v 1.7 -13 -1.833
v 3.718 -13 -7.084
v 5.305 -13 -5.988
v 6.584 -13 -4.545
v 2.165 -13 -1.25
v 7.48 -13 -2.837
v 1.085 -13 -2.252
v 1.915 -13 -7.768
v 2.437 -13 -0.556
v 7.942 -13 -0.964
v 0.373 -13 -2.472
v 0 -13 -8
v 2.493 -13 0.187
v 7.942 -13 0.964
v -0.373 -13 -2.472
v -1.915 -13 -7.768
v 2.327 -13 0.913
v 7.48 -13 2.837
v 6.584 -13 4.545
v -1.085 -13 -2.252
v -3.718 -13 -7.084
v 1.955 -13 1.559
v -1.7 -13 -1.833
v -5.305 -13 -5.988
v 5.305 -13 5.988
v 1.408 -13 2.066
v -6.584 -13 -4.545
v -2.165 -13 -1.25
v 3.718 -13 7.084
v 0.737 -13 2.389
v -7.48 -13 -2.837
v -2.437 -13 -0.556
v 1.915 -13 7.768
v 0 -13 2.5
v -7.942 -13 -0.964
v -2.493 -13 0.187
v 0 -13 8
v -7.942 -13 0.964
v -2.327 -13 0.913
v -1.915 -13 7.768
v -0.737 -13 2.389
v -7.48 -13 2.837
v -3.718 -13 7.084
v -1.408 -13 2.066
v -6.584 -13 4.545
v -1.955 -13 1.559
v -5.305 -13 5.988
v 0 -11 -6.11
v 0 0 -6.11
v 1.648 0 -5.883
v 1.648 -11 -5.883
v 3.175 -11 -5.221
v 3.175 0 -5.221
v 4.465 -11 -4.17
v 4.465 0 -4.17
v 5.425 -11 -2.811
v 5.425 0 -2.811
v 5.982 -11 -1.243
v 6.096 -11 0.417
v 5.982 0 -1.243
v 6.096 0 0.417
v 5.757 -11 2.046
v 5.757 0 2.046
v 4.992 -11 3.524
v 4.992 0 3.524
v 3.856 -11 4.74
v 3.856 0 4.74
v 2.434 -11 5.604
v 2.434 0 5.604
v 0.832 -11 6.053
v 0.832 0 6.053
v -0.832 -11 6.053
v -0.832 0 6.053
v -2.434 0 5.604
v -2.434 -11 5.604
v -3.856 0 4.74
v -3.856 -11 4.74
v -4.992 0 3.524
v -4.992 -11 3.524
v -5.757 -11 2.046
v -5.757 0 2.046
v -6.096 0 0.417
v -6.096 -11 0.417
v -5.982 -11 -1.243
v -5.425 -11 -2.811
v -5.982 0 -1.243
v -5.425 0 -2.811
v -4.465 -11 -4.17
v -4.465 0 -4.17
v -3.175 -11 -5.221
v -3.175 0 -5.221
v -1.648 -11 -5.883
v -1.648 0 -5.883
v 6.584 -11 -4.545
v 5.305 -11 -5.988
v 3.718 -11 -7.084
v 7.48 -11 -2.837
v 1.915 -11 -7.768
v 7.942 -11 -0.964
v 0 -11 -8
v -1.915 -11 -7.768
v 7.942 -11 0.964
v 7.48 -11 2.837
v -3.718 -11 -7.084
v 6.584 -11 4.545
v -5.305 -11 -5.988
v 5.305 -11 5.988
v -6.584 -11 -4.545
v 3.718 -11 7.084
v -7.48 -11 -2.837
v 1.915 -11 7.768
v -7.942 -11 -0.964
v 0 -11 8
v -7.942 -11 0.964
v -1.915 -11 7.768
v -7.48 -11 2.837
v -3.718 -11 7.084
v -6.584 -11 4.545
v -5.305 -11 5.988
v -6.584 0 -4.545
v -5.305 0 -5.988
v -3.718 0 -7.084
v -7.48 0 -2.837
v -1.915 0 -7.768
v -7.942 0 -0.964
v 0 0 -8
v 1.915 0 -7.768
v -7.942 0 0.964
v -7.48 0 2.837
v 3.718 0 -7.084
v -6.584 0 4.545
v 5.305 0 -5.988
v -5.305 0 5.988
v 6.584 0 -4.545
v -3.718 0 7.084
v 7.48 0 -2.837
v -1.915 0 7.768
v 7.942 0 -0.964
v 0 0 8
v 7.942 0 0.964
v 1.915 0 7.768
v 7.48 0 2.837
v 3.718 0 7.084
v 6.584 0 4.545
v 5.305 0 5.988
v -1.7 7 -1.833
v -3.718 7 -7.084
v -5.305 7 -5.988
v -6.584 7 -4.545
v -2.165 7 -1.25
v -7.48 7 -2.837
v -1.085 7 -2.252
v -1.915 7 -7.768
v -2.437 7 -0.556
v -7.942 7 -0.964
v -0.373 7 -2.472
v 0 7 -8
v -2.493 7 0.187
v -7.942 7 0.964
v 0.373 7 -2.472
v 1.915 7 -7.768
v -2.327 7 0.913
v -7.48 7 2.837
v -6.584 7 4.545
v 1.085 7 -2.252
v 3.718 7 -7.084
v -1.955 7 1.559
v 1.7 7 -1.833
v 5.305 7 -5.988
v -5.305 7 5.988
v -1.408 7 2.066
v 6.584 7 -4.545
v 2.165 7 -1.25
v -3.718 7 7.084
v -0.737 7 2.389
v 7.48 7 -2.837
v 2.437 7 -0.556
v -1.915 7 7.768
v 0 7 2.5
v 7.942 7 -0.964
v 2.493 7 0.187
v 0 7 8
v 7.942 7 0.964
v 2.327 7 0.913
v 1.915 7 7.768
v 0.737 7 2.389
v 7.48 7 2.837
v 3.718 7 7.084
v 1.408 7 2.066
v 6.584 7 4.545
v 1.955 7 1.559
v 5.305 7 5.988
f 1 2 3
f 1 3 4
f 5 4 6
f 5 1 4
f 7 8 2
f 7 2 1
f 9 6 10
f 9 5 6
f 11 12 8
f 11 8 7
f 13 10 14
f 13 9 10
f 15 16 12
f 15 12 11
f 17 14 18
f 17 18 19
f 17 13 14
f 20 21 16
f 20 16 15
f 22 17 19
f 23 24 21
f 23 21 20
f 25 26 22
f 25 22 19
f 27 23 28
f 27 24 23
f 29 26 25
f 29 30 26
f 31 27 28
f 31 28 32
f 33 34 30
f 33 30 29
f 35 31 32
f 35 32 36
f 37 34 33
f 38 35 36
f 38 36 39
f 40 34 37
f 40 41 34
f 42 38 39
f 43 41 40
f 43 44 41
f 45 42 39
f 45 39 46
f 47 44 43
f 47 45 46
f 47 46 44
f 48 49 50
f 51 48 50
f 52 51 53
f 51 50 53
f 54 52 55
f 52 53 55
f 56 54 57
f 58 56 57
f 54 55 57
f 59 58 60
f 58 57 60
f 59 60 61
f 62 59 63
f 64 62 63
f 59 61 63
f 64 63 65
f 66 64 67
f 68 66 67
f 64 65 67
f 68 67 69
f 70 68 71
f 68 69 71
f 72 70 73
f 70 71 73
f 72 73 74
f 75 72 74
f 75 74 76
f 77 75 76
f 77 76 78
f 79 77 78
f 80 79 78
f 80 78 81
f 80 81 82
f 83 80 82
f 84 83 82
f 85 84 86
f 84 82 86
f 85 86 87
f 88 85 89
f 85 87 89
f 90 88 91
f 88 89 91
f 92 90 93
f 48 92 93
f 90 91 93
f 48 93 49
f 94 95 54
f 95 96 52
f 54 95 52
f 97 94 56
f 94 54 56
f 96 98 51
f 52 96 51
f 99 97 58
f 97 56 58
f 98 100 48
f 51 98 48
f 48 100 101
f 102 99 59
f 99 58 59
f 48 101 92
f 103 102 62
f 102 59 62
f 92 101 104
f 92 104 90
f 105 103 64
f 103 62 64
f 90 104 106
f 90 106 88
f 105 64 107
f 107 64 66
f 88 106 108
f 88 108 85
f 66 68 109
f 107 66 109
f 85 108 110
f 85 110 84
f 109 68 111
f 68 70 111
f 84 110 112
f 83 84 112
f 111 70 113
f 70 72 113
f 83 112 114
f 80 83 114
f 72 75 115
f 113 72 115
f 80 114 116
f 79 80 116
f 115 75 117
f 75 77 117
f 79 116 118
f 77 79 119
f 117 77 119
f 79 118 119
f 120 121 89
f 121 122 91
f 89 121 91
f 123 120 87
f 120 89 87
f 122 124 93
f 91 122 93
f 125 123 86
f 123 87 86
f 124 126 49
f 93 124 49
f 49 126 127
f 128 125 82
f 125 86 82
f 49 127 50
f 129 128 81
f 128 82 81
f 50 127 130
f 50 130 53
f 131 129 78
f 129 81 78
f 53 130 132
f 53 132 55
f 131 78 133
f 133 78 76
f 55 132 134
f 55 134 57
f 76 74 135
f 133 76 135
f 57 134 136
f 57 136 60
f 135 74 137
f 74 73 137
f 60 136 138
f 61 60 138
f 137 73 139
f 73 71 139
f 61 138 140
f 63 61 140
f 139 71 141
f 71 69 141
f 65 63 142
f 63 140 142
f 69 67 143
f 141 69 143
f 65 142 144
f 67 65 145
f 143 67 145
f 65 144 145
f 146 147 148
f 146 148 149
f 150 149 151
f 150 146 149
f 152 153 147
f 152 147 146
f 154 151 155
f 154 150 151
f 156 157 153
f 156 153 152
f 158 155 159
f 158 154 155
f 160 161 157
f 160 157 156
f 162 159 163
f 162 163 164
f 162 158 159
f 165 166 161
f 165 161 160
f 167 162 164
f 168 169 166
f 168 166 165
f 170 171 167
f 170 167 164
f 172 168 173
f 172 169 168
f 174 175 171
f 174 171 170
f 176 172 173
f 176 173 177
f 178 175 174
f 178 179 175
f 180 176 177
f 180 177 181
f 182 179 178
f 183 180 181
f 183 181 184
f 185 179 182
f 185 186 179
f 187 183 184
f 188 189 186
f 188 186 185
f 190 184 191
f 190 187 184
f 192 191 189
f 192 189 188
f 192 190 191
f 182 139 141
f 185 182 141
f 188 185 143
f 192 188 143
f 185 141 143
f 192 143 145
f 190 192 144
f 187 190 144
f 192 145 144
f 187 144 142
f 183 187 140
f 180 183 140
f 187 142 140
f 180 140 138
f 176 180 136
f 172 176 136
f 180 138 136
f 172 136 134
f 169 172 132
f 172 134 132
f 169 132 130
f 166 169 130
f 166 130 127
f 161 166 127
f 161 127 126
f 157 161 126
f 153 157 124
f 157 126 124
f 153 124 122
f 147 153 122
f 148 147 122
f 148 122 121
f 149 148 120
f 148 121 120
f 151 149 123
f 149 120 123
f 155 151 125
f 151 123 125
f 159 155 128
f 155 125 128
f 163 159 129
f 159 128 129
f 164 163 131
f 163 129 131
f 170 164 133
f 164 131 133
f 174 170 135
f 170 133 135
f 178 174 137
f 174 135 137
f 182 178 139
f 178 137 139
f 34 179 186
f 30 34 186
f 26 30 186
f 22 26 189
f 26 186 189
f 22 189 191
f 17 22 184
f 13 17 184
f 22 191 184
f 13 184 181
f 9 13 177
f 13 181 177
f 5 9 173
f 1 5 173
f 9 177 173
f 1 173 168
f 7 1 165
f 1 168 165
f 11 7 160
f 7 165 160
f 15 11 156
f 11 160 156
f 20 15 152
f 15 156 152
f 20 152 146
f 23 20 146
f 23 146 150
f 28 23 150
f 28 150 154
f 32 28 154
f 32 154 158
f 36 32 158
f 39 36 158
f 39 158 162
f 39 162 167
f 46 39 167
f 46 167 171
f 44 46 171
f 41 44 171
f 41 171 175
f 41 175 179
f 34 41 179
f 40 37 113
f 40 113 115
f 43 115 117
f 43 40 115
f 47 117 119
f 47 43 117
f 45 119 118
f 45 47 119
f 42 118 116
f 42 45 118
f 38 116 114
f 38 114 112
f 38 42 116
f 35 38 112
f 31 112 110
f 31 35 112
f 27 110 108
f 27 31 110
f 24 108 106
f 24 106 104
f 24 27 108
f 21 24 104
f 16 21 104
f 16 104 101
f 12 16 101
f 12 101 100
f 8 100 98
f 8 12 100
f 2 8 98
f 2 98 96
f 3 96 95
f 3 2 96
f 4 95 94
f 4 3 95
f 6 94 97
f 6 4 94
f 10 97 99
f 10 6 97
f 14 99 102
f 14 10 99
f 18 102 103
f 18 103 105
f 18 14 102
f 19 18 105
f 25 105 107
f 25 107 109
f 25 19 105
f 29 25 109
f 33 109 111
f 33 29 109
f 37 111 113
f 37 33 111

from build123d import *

# Parameters (mm, degrees)
SKETCH_1_R          = 8
EXTRUDE_1_DEPTH     = 7
SKETCH_2_R          = 6.11
EXTRUDE_2_DEPTH     = 11
EXTRUDE_START       = 2
SKETCH_3_R          = 8
EXTRUDE_3_DEPTH     = 2
SKETCH_4_R          = 2.5
CUT_EXTRUDE_1_DEPTH = 25


with BuildPart() as part:
    # 草图1 → 凸台-拉伸1 (new body)
    with BuildSketch(Plane(origin=(0, 0, 0), x_dir=(1, 0, 0), z_dir=(0, 1, 0))):
        with Locations(Location((0, 0, 0), (0, 0, 270))):
            Circle(SKETCH_1_R)
    extrude(amount=EXTRUDE_1_DEPTH)

    # 草图2 → 凸台-拉伸2 (add)
    with BuildSketch(Plane.XZ):
        with Locations(Location((0, 0, 0), (0, 0, 270))):
            Circle(SKETCH_2_R)
    extrude(amount=EXTRUDE_2_DEPTH)

    # 草图3 → 凸台-拉伸3 (add)
    with BuildSketch(Plane.XZ.offset(11).offset(EXTRUDE_START)):
        with Locations(Location((0, 0, 0), (0, 0, 90))):
            Circle(SKETCH_3_R)
    extrude(amount=-EXTRUDE_3_DEPTH)

    # 草图4 → 切除-拉伸1 (cut)
    with BuildSketch(Plane(origin=(0, 7, 0), x_dir=(1, 0, 0), z_dir=(0, 1, 0))):
        with Locations(Location((0, 0, 0), (0, 0, 270))):
            Circle(SKETCH_4_R)
    extrude(amount=-CUT_EXTRUDE_1_DEPTH, mode=Mode.SUBTRACT)


solid = part.part
